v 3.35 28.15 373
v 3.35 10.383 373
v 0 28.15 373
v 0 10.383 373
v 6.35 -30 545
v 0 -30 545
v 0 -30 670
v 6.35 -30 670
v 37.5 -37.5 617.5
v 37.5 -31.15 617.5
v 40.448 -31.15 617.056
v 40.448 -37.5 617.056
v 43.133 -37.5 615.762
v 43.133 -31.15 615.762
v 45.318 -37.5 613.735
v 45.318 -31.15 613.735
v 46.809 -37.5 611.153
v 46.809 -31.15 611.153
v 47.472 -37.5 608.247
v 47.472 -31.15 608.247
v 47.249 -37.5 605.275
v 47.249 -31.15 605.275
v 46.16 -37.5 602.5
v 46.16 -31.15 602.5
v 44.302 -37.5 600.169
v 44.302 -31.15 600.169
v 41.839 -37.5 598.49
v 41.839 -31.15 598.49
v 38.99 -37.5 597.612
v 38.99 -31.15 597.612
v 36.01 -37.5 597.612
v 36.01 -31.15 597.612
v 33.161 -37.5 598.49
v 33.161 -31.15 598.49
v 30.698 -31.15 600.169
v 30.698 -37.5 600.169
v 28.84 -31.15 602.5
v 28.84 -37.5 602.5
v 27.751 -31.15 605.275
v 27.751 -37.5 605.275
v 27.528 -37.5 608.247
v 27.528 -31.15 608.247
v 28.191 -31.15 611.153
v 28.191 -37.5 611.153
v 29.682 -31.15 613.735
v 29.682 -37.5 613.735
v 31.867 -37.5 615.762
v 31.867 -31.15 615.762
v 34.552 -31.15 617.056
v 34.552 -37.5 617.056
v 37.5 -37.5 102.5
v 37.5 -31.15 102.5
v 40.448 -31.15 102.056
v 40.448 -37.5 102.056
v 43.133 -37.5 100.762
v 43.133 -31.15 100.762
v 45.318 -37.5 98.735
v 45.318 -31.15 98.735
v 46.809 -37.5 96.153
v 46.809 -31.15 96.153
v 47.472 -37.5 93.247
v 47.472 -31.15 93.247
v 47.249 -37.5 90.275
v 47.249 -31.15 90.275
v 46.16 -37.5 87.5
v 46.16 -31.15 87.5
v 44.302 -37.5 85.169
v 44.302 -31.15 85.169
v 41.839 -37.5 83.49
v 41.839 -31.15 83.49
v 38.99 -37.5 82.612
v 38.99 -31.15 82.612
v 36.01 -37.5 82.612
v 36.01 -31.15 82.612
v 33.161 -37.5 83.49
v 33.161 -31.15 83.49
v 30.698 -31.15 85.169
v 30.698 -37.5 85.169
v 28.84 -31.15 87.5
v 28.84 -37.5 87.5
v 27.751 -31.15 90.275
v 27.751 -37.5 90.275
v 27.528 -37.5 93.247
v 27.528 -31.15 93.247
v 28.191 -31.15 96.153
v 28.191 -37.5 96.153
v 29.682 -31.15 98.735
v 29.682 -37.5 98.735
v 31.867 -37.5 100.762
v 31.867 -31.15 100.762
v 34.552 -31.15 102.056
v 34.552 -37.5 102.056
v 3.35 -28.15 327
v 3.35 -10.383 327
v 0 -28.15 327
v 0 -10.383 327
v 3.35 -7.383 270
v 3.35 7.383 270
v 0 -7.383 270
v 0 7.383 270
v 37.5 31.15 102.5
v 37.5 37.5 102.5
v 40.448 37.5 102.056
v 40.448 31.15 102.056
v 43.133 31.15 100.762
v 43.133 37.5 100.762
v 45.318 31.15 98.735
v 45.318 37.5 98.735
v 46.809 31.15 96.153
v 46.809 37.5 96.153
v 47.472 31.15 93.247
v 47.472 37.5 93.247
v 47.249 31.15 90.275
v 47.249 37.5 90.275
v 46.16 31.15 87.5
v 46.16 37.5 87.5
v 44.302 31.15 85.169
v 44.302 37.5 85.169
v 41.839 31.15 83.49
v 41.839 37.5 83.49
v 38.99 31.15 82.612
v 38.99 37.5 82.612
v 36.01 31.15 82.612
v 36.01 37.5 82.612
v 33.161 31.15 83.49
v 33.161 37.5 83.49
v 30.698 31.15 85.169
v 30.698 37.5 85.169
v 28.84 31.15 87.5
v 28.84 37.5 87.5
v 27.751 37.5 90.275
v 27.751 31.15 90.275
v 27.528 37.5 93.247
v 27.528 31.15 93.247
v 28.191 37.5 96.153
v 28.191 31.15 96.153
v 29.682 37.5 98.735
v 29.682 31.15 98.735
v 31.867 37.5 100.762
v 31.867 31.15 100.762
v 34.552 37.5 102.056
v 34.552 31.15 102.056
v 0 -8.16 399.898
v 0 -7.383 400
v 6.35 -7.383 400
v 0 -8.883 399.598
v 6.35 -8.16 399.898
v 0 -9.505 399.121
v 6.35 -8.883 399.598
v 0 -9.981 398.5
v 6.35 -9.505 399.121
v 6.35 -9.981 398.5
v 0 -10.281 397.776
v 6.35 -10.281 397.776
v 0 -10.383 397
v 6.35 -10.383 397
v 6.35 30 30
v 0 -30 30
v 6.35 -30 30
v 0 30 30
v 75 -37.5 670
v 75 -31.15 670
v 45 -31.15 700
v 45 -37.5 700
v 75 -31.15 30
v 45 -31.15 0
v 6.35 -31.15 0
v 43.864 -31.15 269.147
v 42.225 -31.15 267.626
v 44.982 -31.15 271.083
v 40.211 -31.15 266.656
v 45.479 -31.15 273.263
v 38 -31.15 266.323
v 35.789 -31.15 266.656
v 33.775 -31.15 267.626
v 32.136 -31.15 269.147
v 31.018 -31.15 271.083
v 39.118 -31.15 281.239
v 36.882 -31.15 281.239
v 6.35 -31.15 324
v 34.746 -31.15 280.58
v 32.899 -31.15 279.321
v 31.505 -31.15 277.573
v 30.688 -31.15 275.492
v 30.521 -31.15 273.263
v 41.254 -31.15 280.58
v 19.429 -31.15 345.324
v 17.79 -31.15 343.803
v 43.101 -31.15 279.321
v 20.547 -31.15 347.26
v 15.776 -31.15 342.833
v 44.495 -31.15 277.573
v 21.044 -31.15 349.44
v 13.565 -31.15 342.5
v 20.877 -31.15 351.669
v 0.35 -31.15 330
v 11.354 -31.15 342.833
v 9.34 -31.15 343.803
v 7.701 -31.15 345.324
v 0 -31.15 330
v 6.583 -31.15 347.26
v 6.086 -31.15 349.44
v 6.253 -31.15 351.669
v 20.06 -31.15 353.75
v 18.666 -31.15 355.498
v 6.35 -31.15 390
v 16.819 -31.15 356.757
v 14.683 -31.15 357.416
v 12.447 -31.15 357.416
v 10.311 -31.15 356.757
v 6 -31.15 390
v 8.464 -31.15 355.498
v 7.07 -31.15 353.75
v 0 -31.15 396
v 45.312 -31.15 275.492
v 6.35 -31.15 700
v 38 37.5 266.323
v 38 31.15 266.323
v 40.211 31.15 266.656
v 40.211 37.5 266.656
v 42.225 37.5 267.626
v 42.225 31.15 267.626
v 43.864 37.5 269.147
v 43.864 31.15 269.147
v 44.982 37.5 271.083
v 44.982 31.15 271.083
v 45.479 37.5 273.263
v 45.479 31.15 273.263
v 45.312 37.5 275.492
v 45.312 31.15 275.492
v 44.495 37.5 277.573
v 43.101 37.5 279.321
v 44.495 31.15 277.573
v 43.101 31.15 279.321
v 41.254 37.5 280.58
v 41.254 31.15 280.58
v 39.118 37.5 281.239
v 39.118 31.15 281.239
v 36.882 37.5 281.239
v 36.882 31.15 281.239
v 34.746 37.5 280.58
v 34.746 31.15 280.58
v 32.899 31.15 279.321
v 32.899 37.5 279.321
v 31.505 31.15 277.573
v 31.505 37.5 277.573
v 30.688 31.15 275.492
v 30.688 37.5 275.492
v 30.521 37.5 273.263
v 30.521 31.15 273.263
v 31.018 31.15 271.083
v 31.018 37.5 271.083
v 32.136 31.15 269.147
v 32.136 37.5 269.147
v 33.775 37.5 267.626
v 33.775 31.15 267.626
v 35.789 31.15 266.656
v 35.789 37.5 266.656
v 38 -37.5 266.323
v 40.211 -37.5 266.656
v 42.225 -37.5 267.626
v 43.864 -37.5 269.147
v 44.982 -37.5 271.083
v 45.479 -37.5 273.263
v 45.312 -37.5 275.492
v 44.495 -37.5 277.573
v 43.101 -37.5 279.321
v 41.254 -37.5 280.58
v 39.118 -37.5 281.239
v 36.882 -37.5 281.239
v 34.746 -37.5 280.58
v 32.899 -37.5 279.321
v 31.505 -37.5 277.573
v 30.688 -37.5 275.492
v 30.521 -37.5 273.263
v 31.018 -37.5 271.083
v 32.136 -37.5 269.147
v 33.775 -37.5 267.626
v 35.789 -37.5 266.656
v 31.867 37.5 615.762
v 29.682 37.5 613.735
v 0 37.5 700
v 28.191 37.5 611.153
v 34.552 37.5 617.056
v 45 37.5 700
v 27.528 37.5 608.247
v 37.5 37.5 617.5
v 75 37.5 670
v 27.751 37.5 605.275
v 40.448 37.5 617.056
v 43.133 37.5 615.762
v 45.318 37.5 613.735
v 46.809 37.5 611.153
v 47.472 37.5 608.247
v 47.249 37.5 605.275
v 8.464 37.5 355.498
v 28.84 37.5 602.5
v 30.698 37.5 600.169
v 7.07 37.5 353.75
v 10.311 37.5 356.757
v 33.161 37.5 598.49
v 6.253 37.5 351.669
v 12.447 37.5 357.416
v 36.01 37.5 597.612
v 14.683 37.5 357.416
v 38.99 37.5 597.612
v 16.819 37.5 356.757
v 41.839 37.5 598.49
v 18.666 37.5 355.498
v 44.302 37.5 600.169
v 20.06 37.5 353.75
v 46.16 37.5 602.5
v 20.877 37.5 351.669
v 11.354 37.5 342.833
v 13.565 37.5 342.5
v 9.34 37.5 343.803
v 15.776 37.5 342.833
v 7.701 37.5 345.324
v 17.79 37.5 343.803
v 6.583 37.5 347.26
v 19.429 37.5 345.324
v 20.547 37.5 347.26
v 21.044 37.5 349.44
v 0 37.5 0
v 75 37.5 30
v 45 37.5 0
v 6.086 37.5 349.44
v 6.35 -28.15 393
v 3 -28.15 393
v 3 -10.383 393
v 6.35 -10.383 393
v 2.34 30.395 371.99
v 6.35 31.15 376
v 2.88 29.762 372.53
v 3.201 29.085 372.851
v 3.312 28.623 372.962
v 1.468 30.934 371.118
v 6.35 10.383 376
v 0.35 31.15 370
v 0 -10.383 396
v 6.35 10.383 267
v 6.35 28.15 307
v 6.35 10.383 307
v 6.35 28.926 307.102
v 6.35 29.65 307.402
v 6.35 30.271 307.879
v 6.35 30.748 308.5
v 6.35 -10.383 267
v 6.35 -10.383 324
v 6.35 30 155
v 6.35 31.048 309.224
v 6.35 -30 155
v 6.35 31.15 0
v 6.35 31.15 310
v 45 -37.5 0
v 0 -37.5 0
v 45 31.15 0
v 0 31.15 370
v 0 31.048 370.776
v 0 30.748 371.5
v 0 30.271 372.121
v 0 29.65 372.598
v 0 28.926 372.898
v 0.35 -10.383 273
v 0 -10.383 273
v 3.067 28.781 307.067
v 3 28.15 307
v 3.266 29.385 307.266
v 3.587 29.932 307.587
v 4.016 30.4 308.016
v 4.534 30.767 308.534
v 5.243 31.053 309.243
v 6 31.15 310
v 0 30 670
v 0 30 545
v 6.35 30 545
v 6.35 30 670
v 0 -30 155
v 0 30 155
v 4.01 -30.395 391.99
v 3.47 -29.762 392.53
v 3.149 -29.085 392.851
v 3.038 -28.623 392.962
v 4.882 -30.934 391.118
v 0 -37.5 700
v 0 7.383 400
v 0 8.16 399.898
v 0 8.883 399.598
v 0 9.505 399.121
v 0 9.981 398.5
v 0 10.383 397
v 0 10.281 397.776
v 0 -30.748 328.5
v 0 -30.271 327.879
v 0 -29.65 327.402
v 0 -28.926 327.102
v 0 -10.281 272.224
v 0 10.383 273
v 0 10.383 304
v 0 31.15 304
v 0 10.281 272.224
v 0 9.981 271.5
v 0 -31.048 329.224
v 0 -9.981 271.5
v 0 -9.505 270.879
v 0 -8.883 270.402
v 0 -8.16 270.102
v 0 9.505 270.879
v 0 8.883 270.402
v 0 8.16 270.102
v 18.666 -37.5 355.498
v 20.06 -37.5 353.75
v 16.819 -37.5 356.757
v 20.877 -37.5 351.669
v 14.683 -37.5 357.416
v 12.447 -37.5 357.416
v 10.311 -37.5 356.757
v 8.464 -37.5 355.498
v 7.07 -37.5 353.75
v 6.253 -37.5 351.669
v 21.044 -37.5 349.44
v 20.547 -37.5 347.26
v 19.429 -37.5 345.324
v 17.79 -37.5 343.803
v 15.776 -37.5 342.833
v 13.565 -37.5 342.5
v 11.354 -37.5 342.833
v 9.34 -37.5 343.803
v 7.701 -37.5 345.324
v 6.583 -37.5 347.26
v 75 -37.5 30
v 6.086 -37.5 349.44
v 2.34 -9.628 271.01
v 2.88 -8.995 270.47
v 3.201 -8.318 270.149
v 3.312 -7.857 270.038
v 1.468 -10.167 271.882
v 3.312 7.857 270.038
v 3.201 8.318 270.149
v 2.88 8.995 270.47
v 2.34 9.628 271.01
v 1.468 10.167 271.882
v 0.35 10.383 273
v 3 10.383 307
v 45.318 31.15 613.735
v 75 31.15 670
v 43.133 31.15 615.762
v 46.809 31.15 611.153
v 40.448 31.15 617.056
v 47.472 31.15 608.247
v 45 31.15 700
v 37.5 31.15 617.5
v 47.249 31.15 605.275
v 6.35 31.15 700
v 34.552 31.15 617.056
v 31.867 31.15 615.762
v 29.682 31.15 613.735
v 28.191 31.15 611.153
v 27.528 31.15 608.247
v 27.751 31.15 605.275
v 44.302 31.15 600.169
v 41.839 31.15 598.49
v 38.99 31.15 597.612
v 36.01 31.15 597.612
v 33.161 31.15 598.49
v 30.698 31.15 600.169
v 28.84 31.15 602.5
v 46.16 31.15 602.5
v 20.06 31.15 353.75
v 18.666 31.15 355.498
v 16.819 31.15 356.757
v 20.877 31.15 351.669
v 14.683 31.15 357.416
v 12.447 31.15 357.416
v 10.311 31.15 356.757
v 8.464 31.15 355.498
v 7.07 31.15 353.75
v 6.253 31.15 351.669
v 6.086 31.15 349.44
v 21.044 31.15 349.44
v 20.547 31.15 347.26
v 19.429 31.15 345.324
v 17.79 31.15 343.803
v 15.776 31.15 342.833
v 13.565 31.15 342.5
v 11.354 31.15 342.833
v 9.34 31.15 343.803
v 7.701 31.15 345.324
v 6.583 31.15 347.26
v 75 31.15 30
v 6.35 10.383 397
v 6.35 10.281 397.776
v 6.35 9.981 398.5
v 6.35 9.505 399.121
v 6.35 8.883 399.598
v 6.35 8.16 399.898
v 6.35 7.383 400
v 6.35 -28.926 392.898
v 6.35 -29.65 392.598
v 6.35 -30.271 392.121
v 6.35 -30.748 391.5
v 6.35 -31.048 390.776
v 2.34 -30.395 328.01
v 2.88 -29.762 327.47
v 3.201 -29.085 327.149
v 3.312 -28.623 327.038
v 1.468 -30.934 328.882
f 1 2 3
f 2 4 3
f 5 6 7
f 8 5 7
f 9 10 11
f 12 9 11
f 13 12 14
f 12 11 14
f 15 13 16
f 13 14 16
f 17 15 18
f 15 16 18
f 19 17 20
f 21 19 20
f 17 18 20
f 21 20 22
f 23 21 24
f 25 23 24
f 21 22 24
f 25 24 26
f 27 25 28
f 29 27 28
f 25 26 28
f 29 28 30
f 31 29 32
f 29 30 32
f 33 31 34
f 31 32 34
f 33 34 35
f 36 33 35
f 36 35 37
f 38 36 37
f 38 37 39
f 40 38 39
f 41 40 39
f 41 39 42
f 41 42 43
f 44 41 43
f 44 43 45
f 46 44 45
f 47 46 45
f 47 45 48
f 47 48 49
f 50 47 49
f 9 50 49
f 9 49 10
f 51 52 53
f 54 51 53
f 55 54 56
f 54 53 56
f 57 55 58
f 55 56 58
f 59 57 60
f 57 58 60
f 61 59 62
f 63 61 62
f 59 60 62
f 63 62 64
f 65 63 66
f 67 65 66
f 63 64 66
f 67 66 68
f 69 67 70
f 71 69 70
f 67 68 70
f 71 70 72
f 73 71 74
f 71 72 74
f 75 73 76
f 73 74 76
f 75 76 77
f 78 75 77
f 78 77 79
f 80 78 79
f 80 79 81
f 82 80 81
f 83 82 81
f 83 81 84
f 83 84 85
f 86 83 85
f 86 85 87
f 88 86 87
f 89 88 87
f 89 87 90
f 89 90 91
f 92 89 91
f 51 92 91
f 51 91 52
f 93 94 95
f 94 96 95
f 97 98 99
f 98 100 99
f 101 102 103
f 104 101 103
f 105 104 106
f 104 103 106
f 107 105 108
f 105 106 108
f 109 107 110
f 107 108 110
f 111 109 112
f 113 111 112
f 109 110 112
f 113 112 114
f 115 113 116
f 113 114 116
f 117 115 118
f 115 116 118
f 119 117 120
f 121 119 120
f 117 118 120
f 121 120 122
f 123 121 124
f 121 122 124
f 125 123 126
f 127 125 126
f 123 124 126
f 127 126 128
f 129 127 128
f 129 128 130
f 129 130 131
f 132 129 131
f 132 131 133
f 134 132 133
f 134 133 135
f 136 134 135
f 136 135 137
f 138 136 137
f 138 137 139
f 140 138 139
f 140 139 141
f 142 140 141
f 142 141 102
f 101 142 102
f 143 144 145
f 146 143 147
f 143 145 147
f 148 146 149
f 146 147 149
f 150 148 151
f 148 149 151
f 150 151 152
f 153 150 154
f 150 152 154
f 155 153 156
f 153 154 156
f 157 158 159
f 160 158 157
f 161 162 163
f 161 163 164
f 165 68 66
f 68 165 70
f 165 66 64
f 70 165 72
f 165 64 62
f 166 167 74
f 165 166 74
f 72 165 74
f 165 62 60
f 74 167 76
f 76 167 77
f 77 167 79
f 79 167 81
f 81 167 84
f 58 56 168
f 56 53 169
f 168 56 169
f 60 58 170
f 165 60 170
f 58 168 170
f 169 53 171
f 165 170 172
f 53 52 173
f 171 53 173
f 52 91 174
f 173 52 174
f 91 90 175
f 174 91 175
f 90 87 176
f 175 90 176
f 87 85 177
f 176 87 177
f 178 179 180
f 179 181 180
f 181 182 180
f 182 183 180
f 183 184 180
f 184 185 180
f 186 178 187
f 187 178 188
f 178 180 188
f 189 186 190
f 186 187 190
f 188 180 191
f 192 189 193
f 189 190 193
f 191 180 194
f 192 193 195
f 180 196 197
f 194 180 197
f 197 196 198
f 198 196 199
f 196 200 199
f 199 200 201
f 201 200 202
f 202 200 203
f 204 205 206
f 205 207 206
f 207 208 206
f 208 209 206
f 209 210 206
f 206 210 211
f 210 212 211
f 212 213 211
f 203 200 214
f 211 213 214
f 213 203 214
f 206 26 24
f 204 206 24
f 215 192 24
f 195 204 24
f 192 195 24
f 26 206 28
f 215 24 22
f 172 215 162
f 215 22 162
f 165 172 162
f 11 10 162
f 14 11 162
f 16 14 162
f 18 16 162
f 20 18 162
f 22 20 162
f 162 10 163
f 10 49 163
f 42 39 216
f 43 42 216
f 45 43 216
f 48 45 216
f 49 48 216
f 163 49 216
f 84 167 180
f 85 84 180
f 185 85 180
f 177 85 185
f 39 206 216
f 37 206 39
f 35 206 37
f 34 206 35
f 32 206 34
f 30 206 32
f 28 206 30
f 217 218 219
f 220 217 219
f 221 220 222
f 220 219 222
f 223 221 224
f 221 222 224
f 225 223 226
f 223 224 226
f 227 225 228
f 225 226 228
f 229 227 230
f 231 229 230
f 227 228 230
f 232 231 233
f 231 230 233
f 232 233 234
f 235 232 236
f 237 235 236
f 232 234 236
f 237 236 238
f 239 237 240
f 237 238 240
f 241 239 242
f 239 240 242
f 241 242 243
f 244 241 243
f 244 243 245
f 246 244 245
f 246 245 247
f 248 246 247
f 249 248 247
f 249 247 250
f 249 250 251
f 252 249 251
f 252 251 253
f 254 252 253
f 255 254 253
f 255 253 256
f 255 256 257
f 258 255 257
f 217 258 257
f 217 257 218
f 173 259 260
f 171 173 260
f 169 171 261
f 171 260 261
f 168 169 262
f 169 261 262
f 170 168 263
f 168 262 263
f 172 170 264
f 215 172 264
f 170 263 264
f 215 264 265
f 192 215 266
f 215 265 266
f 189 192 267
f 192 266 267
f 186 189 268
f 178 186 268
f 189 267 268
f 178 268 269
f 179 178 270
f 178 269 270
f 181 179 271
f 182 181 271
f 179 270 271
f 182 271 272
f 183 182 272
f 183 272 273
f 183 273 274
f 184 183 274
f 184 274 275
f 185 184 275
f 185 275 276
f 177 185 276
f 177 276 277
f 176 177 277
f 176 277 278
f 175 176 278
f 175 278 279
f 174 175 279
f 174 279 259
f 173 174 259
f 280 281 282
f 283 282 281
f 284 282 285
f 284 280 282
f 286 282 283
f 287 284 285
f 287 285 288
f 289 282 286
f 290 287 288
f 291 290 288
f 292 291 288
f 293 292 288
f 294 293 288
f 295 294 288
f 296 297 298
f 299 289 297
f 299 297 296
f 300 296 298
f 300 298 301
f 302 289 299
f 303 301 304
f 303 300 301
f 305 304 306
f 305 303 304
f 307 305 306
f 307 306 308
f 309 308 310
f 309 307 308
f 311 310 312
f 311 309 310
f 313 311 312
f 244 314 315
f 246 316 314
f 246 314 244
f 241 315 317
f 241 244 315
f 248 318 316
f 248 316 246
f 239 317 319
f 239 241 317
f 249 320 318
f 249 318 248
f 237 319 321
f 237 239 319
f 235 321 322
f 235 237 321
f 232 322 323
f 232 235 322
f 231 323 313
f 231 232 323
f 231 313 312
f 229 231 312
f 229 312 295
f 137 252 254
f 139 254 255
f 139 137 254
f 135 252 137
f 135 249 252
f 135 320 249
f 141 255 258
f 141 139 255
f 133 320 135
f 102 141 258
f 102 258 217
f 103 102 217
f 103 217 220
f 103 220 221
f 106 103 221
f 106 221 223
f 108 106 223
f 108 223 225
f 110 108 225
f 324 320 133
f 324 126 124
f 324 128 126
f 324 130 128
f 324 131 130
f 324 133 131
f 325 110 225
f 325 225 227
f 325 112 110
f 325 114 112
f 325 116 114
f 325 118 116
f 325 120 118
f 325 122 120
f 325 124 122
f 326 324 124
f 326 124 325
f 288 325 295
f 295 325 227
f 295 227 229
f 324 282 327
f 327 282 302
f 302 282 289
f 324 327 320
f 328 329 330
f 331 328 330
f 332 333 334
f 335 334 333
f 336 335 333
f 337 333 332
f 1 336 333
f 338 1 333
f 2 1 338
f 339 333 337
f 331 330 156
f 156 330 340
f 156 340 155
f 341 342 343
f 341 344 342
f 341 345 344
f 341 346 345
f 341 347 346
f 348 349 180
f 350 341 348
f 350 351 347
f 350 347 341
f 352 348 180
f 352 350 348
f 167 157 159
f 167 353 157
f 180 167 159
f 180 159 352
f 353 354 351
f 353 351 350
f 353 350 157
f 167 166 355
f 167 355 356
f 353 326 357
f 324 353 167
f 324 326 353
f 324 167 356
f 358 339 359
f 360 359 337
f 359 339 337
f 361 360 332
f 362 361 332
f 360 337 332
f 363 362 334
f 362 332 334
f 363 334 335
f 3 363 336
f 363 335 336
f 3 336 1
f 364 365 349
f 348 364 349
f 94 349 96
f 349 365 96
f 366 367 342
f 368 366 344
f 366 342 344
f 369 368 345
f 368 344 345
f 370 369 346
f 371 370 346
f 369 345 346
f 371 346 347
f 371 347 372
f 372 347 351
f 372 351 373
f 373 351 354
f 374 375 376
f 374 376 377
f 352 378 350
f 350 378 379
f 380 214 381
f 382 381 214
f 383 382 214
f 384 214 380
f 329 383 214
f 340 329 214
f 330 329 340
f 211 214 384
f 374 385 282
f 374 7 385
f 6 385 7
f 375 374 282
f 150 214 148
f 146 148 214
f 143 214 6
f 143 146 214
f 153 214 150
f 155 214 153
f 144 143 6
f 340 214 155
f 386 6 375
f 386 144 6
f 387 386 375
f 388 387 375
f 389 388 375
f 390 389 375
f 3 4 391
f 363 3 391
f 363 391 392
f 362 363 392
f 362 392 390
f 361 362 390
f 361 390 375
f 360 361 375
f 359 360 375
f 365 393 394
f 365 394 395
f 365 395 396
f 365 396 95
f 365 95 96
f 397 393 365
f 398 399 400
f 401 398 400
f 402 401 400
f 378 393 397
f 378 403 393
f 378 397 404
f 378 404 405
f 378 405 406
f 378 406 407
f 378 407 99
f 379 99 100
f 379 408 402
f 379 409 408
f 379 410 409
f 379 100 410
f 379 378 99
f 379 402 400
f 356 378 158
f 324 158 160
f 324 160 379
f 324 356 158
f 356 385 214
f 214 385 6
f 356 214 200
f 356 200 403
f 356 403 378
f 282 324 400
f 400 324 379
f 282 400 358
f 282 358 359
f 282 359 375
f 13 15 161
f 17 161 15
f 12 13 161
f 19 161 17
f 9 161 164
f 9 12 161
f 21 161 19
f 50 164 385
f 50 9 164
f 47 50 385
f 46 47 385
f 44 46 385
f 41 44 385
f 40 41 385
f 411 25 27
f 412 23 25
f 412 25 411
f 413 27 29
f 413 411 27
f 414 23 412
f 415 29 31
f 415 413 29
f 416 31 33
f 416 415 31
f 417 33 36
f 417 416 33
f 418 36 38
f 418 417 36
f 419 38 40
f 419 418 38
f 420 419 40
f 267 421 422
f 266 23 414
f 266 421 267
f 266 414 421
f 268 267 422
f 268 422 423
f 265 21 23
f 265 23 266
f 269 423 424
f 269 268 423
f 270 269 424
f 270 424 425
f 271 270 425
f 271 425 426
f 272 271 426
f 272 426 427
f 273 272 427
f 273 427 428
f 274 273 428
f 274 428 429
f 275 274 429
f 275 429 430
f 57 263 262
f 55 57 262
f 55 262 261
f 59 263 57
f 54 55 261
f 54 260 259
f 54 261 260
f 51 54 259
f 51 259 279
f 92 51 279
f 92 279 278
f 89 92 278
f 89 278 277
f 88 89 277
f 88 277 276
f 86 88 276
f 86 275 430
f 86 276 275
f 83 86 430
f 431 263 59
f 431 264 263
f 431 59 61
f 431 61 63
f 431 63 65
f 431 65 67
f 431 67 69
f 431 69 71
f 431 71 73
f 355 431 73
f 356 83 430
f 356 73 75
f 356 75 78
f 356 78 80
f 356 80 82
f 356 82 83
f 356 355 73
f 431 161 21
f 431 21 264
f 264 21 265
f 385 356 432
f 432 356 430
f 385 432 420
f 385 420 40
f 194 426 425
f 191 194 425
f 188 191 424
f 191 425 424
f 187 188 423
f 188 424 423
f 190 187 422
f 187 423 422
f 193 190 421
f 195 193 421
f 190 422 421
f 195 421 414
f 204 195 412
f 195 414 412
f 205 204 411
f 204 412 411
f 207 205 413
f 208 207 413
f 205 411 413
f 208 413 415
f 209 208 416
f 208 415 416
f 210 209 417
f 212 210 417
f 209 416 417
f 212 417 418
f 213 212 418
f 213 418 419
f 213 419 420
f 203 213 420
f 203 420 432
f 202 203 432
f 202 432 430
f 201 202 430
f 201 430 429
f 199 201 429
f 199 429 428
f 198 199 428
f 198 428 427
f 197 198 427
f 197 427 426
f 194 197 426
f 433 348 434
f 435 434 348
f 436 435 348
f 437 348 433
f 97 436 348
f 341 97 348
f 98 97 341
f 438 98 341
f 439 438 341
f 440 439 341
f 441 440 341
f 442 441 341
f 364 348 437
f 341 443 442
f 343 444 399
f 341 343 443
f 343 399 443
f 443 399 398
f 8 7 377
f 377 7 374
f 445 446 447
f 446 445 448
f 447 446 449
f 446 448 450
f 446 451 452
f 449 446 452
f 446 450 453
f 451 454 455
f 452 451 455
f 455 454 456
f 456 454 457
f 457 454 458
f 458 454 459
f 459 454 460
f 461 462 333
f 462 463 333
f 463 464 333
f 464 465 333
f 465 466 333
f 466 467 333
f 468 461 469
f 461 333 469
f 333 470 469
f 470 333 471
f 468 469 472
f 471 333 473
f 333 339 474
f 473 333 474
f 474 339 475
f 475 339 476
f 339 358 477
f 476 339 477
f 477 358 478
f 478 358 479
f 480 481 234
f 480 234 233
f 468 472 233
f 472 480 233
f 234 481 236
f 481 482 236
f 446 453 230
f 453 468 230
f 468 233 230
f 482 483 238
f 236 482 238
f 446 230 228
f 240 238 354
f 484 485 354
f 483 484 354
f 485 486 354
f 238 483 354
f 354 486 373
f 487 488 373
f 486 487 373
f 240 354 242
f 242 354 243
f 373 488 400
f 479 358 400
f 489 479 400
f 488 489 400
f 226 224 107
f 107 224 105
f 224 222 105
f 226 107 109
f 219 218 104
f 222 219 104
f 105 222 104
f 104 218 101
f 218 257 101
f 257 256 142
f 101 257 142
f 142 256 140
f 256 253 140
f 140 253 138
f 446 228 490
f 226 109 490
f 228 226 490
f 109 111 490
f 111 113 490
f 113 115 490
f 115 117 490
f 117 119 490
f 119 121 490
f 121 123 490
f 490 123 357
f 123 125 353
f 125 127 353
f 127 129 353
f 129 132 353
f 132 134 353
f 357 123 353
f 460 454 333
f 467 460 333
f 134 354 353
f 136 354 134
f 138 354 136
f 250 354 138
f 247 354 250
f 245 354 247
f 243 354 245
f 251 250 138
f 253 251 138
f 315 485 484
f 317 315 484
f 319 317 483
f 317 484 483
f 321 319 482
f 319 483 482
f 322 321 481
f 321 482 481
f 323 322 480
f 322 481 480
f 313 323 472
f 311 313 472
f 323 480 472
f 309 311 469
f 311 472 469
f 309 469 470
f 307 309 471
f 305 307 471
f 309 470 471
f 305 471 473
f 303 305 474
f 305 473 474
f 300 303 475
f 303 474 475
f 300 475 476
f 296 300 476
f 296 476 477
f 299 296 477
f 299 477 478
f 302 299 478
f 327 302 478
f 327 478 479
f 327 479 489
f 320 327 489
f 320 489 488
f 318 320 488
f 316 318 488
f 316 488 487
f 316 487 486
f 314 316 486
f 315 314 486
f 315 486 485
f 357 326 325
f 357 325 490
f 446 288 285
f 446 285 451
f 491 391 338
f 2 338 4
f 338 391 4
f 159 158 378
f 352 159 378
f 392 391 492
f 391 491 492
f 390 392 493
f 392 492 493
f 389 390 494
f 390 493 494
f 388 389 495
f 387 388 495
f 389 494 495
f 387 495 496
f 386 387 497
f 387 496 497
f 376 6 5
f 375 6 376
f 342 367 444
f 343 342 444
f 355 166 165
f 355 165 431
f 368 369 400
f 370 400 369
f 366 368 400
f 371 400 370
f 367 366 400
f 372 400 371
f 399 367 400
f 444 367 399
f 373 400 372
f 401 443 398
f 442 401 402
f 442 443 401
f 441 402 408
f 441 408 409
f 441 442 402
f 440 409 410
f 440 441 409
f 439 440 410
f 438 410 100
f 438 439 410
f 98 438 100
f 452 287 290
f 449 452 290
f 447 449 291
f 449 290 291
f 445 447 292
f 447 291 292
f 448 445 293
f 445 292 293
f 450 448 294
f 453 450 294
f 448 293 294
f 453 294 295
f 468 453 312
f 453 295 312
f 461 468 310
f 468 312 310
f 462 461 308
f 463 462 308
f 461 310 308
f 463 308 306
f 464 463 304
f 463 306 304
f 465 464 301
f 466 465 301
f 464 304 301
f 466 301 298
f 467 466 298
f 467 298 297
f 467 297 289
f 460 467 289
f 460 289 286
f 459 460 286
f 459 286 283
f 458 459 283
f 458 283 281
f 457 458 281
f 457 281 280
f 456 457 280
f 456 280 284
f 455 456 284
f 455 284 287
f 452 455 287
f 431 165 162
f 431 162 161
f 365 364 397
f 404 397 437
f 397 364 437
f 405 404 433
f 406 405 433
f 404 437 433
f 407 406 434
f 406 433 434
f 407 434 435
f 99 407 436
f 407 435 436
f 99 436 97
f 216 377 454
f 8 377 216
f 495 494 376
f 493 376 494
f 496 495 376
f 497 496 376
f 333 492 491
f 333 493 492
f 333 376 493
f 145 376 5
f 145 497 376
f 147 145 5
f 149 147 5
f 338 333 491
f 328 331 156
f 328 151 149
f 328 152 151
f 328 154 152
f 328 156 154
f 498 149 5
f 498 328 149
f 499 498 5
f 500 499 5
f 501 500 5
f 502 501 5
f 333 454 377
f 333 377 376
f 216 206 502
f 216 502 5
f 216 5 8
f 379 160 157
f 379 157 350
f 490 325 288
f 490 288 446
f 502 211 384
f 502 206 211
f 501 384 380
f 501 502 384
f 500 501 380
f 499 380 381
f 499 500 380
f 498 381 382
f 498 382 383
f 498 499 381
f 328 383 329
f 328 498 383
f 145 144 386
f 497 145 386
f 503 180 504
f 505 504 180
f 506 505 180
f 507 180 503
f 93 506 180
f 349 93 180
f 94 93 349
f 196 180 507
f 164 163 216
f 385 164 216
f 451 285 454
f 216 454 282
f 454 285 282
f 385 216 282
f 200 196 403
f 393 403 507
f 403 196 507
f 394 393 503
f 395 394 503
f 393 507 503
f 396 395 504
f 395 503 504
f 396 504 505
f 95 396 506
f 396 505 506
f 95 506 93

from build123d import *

# Parameters (mm, degrees)
BOSS_EXTRUDE1_DEPTH = 700
SKETCH3_W           = 125
SKETCH3_H           = 60
CUT_EXTRUDE1_DEPTH  = 706.00443261
CHAMFER1_SIZE       = 30
SKETCH4_R           = 10
CUT_EXTRUDE2_DEPTH  = 708.990112925
SKETCH5_R           = 7.5
CUT_EXTRUDE3_DEPTH  = 708.990112925
CHAMFER2_SIZE       = 3
FILLET1_R           = 3


with BuildPart() as part:
    # Sketch1 → Boss-Extrude1 (new body)
    with BuildSketch(Plane.XY):
        Polygon((0, -37.5), (0, 37.5), (75, 37.5), (75, 31.15), (6.35, 31.15), (6.35, -31.15), (75, -31.15), (75, -37.5), align=None)
    extrude(amount=BOSS_EXTRUDE1_DEPTH)

    # Sketch3 → Cut-Extrude1 (cut, through all)
    with BuildSketch(Plane.ZY):
        with Locations((92.5, 0)):
            Rectangle(SKETCH3_W, SKETCH3_H)
        with Locations((607.5, 0)):
            Rectangle(SKETCH3_W, SKETCH3_H)
        Polygon((400, 10.383333333), (373, 10.383333333), (373, 31.15), (327, 31.15), (307, 31.15), (307, 10.383333333), (300, 10.383333333), (270, 10.383333333), (270, -10.383333333), (300, -10.383333333), (327, -10.383333333), (327, -31.15), (373, -31.15), (393, -31.15), (393, -10.383333333), (400, -10.383333333), align=None)
    extrude(amount=-CUT_EXTRUDE1_DEPTH, mode=Mode.SUBTRACT)

    # Chamfer1
    chamfer1_edges = [part.edges().sort_by_distance(p)[0] for p in [
        (75, -34.325, 0),
        (75, 34.325, 700),
        (75, -34.325, 700),
        (75, 34.325, 0),
    ]]
    chamfer(chamfer1_edges, length=CHAMFER1_SIZE)

    # Sketch4 → Cut-Extrude2 (cut, through all)
    with BuildSketch(Plane(origin=(0, 37.5, 0), x_dir=(1, 0, 0), z_dir=(0, 1, 0))):
        with Locations(Location((37.5, -607.5, 0), (0, 0, 270))):
            Circle(SKETCH4_R)
        with Locations(Location((37.5, -92.5, 0), (0, 0, 270))):
            Circle(SKETCH4_R)
    extrude(amount=-CUT_EXTRUDE2_DEPTH, mode=Mode.SUBTRACT)

    # Sketch5 → Cut-Extrude3 (cut, through all)
    with BuildSketch(Plane.XZ.offset(37.5)):
        with Locations(Location((38, 273.823015652, 0), (0, 0, 270))):
            Circle(SKETCH5_R)
        with Locations(Location((13.565044391, 350, 0), (0, 0, 270))):
            Circle(SKETCH5_R)
    extrude(amount=-CUT_EXTRUDE3_DEPTH, mode=Mode.SUBTRACT)

    # Chamfer2
    chamfer2_edges = [part.edges().sort_by_distance(p)[0] for p in [
        (6.35, -20.766666667, 327),
        (6.35, 0, 270),
        (6.35, 20.766666667, 373),
        (0, -20.766666667, 393),
        (0, 20.766666667, 307),
    ]]
    chamfer(chamfer2_edges, length=CHAMFER2_SIZE)

    # Fillet1
    fillet1_edges = [part.edges().sort_by_distance(p)[0] for p in [
        (1.675, 10.383333333, 270),
        (1.675, -10.383333333, 270),
        (1.675, 31.15, 373),
        (1.675, -31.15, 327),
        (4.675, -31.15, 393),
        (4.675, 31.15, 307),
        (3.175, 10.383333333, 400),
        (3.175, -10.383333333, 400),
    ]]
    fillet(fillet1_edges, radius=FILLET1_R)


solid = part.part
